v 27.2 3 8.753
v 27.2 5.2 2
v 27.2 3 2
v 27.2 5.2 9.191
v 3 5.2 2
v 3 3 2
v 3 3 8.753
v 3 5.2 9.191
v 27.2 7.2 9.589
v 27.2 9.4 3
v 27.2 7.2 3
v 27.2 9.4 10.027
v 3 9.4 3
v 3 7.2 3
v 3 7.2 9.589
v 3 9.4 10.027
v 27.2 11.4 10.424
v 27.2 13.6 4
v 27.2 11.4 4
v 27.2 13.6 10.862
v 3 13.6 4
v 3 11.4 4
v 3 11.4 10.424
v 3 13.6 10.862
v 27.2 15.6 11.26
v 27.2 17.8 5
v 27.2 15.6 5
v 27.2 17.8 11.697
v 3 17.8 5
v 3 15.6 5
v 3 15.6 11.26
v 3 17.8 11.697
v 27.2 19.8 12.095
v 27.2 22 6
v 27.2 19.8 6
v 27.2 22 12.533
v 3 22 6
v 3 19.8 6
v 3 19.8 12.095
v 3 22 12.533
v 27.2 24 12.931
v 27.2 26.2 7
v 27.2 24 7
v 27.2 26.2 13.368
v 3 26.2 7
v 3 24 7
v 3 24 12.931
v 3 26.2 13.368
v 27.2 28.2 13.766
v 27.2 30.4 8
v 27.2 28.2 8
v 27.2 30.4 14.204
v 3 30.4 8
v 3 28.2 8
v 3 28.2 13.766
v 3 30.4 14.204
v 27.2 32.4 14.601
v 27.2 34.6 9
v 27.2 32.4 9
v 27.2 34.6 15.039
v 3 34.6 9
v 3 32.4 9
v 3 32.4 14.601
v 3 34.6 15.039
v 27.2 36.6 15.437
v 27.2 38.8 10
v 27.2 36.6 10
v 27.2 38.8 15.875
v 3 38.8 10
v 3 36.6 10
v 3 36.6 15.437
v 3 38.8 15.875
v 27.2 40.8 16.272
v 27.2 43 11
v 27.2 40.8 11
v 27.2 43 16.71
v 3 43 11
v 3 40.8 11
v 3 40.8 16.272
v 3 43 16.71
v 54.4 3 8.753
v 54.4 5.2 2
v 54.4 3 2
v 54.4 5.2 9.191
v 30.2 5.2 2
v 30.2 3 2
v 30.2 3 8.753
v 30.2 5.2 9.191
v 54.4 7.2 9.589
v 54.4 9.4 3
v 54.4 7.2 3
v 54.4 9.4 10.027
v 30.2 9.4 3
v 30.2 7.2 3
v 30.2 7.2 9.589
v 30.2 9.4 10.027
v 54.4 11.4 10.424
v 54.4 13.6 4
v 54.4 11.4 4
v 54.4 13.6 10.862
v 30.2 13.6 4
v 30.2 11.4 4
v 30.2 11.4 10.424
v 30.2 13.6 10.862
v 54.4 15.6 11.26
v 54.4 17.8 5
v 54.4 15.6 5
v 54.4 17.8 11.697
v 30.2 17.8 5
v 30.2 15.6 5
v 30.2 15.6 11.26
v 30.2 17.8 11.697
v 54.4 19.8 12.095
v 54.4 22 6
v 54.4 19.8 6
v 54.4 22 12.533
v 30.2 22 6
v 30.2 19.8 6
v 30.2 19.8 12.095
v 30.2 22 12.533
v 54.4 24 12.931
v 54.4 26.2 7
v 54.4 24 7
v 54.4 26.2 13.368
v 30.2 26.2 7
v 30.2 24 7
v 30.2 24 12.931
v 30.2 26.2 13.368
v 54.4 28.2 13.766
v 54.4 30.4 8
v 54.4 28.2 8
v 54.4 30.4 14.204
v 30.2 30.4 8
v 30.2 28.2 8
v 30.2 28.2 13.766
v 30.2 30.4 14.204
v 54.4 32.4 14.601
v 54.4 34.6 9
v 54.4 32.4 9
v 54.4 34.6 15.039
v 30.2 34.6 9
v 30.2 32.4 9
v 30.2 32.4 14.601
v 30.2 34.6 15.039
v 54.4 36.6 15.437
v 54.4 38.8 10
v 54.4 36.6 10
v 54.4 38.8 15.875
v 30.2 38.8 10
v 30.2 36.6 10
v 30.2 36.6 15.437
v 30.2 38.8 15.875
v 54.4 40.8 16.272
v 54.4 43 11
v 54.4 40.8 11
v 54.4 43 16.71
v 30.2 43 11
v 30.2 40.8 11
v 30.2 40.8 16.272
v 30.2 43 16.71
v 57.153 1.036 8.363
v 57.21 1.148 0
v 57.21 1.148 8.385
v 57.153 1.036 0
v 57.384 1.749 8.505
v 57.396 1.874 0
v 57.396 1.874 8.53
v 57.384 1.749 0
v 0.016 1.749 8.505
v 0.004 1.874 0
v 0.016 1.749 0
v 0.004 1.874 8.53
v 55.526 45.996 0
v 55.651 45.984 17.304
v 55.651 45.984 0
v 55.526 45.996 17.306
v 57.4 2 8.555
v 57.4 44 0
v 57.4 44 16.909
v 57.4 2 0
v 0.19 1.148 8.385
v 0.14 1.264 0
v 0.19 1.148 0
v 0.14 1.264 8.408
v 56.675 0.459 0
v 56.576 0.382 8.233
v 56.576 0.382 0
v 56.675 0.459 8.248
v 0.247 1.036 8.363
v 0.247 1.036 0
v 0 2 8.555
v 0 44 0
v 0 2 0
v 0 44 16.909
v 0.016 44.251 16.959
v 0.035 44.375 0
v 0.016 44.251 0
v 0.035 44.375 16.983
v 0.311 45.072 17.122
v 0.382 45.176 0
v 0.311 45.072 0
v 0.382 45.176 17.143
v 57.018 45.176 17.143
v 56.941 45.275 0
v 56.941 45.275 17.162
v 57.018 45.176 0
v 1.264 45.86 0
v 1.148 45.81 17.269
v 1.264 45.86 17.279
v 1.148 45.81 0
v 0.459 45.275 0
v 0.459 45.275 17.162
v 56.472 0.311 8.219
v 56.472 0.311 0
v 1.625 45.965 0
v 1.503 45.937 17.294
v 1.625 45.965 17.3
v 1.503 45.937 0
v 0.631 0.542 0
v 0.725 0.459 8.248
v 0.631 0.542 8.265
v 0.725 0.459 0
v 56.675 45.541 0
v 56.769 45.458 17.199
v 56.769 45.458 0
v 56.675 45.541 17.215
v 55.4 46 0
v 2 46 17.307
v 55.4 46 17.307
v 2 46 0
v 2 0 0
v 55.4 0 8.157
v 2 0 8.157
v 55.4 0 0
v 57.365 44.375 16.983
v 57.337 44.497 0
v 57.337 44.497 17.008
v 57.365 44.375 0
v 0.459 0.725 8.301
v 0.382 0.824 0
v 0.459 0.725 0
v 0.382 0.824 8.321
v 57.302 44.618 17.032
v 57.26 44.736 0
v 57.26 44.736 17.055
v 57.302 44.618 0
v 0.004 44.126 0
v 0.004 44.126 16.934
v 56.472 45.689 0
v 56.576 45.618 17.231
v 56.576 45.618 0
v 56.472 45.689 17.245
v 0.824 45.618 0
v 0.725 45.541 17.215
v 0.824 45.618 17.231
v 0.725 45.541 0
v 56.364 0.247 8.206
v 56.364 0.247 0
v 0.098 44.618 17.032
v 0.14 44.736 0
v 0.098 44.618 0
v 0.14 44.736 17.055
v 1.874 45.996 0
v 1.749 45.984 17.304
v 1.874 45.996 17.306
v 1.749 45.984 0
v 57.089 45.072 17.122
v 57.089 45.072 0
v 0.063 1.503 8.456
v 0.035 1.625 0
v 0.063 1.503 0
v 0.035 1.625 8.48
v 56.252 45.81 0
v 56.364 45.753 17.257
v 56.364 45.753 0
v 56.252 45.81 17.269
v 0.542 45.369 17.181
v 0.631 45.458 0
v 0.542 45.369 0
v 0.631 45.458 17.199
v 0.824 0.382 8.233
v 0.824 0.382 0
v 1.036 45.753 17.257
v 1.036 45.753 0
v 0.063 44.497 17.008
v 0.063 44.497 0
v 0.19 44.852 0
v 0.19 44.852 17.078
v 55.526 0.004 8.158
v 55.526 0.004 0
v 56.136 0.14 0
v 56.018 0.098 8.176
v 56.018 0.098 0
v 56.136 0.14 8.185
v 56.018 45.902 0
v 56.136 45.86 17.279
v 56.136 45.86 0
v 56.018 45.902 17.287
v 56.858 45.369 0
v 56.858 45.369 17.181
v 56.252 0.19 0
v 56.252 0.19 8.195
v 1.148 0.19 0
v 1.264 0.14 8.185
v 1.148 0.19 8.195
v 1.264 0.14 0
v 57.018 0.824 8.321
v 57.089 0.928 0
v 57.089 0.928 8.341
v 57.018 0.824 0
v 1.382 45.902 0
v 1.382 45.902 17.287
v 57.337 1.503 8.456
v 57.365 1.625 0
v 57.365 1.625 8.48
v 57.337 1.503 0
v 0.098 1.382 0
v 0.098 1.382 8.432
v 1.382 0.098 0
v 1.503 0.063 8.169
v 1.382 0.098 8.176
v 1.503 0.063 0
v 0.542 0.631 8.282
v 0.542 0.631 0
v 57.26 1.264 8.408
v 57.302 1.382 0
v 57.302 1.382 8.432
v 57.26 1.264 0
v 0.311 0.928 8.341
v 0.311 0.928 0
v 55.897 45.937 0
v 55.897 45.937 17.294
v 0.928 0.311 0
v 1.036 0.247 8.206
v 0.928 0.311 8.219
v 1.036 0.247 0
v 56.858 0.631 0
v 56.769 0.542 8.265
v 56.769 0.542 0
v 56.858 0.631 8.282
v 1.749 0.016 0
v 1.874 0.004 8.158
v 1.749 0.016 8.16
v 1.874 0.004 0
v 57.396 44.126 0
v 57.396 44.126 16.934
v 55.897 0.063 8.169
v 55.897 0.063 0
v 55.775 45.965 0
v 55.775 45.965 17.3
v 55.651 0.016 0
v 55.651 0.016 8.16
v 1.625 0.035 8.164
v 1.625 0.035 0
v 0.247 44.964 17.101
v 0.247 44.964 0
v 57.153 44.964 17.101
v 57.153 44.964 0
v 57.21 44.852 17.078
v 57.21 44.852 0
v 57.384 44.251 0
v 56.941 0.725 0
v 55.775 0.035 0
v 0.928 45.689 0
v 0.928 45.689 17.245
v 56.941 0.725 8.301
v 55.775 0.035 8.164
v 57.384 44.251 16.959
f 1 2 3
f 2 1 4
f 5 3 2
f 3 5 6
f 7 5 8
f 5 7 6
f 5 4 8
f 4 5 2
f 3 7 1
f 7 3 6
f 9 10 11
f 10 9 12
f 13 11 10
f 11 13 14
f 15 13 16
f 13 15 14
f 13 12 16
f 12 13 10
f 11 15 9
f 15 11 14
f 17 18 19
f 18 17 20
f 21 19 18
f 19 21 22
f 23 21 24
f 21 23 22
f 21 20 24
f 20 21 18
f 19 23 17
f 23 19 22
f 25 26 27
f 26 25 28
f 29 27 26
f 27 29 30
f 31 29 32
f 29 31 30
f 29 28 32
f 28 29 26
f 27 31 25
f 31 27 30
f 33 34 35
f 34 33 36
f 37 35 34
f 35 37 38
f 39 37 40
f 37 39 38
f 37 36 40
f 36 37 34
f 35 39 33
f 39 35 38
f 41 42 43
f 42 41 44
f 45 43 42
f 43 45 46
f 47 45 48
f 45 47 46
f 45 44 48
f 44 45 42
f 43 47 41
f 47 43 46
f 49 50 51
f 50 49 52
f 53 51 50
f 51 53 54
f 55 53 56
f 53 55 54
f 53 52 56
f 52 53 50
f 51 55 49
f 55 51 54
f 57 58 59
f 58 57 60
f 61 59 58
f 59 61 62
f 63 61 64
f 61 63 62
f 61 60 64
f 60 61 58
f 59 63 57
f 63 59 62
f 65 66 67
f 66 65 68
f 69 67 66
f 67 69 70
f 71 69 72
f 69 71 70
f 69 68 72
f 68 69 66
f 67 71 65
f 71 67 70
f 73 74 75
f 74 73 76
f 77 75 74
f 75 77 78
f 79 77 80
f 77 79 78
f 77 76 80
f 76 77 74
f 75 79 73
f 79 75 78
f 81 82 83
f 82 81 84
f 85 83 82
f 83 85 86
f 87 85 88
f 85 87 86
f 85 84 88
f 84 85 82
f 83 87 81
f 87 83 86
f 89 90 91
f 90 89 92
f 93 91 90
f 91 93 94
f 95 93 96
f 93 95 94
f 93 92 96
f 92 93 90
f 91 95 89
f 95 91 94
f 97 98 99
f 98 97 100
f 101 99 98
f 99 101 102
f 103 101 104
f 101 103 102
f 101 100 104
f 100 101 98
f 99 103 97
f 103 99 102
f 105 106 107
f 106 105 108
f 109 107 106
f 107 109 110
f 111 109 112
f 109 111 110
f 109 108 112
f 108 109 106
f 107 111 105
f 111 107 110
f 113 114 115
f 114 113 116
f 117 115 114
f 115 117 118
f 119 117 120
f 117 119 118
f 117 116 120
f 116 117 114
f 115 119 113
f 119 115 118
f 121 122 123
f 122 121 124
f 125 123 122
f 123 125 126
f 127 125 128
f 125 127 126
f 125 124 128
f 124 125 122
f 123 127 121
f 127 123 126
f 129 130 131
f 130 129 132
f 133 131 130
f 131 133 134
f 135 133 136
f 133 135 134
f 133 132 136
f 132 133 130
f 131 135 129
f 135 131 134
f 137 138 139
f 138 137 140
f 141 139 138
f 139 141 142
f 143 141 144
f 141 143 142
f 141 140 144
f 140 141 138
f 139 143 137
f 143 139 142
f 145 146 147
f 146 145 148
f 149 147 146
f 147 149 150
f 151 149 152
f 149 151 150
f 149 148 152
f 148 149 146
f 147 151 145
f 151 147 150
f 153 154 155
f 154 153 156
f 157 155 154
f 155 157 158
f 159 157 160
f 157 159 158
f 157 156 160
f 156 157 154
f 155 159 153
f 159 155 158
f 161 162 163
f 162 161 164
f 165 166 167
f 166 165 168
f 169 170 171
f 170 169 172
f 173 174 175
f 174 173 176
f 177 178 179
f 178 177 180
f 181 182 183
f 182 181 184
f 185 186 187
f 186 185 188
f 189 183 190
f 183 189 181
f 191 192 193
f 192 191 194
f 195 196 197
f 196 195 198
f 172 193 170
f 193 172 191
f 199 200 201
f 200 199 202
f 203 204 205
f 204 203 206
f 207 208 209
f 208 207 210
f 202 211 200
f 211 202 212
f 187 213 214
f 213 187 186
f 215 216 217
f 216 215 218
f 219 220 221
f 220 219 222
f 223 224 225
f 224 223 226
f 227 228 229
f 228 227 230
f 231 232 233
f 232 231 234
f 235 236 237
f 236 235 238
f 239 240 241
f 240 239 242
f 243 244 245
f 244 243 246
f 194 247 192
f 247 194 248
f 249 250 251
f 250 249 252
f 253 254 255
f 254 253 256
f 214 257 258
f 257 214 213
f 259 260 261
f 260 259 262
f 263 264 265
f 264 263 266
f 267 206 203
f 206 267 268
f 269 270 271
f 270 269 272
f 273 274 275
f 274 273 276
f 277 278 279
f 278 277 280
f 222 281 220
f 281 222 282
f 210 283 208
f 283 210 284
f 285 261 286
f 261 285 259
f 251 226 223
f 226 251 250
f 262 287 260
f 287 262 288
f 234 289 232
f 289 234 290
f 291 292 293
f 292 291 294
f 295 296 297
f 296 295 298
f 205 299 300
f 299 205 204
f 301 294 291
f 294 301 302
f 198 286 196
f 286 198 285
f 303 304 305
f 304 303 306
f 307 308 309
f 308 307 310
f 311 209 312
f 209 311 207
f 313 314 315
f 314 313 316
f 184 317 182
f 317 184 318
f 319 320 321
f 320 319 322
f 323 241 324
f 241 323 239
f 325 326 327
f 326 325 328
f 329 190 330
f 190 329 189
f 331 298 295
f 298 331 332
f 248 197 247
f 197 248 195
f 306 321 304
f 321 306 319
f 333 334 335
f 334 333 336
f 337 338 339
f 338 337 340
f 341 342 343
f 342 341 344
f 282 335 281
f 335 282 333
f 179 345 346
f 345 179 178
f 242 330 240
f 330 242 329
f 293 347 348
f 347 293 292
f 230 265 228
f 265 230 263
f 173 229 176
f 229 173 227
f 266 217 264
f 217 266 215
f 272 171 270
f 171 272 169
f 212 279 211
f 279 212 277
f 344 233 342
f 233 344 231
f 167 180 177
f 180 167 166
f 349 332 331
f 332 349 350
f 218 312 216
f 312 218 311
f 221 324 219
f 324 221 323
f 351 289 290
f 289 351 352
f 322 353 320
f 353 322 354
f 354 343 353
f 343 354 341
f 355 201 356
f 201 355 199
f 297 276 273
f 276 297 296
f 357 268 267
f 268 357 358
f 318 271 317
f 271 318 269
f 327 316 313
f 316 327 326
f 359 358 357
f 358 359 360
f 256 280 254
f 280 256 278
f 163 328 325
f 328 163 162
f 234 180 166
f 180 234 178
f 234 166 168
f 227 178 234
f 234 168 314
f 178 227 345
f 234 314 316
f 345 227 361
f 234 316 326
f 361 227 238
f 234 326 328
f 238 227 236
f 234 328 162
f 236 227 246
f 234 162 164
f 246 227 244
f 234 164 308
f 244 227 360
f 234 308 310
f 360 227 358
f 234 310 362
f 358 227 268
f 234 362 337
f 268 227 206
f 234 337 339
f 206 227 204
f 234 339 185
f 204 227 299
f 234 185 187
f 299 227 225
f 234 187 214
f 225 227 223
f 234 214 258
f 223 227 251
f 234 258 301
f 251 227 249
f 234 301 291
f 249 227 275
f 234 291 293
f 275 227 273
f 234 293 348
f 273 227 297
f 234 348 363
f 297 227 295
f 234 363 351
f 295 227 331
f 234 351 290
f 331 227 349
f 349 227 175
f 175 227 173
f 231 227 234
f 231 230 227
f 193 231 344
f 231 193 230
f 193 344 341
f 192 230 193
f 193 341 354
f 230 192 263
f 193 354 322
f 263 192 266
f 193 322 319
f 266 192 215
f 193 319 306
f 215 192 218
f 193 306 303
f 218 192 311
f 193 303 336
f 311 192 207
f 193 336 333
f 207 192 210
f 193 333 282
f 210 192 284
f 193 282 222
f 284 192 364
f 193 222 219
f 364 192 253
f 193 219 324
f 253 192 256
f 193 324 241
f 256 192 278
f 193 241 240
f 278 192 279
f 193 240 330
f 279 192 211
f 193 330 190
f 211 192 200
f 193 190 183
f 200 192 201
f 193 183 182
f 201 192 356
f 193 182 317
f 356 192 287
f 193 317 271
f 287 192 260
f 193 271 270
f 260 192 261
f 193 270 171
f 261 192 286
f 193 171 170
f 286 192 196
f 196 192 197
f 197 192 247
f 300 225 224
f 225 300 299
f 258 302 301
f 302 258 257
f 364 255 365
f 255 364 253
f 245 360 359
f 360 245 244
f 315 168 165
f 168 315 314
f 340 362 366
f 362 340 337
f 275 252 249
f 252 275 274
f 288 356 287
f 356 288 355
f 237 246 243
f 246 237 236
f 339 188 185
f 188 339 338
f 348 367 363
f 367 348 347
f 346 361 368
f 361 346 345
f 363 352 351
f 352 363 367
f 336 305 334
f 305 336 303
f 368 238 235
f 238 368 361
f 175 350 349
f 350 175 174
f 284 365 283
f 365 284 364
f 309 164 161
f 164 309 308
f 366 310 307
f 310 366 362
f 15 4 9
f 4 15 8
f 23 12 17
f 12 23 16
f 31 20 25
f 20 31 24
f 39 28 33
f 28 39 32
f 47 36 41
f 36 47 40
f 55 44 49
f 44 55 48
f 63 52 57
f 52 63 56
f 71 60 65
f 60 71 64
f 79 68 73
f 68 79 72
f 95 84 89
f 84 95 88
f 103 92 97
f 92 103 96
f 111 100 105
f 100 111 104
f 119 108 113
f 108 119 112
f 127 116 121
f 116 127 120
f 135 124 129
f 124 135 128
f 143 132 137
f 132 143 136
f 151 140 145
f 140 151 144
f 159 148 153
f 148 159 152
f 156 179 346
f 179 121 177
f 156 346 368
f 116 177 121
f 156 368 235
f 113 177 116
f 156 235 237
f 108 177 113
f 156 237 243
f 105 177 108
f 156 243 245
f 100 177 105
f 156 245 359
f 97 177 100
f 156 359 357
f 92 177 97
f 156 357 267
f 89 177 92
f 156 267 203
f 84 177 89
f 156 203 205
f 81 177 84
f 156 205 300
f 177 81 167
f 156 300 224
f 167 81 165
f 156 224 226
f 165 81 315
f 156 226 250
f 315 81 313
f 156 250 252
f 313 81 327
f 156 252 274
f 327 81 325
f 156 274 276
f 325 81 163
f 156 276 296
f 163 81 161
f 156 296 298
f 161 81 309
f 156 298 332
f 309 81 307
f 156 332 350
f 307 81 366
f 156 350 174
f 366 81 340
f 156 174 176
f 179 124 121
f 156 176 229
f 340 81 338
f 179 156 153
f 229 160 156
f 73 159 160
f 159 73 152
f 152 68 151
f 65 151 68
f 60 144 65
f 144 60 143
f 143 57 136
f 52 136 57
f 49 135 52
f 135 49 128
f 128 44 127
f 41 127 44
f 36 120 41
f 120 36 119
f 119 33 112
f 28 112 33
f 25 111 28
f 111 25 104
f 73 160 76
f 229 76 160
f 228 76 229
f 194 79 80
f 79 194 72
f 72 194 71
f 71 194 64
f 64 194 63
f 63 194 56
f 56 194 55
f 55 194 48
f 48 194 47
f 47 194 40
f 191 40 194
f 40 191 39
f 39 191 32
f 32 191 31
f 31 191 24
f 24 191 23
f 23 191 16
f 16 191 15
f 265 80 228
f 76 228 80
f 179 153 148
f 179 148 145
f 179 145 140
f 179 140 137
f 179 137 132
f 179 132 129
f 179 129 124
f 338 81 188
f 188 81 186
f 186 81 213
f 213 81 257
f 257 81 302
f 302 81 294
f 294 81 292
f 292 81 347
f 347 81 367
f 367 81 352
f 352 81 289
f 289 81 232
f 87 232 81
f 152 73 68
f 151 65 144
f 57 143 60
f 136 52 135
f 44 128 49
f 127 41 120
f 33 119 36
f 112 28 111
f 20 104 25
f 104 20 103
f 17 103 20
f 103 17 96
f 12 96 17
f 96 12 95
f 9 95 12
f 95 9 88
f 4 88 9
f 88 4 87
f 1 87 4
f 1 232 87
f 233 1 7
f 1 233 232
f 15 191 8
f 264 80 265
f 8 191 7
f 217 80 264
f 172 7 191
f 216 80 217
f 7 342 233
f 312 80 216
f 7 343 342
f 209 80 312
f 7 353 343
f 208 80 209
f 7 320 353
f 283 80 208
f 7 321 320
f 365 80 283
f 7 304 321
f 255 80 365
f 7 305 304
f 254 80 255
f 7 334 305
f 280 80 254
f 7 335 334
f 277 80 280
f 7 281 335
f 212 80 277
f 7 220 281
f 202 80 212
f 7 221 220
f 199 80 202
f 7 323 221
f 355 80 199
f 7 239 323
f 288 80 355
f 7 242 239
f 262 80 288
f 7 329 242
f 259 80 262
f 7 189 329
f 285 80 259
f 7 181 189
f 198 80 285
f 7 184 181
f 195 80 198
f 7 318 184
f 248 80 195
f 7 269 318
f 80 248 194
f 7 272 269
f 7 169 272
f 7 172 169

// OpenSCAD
$fn = 100;

row_count = 10;
column_count = 2;
slope_angle = 22.5;
edge_radius = 2;
edge_margin = 3;
slot_length = 24.2;
slot_width = 2.2;
slot_depth = 8;
slot_spacing = 2;

vertical_step = 1;

module rounded_cube(xyz, r) {
    hull() {
        translate([r,      r,            0]) cylinder(xyz.z, r=r);
        translate([xyz.x - r, r,         0]) cylinder(xyz.z, r=r);
        translate([xyz.x - r, xyz.y - r, 0]) cylinder(xyz.z, r=r);
        translate([r,         xyz.y - r, 0]) cylinder(xyz.z, r=r);
    }
}

module slot_column(slot_xyz, count, spacing, step) {   
    for (i = [0 : count - 1]) {
        translate([0, i * (slot_xyz.y + spacing), i * step])
            cube([slot_xyz.x, slot_xyz.y, slot_xyz.z]);
    }
}

module slots_negative(slot_xyz, rows, columns, slot_spacing, column_spacing, step) {
    for (i = [0 : columns - 1]) {
        translate([i * (slot_xyz.x + column_spacing), 0, 0])
            slot_column(slot_xyz, rows, slot_spacing, step);
    }
}

module card_holder(slot_xyz, rows, columns, slot_spacing, column_spacing, step, r) {
    box_width = (slot_xyz.x + column_spacing) * columns + column_spacing;
    box_height = (slot_xyz.y + slot_spacing) * rows + slot_spacing / 2 + column_spacing;
    
    difference() {
        rounded_cube([box_width, box_height, step * (rows - 1) + slot_xyz.z + 2], r=r);
        
            rotate([11.25, 0, 0]) translate([0, 0, slot_xyz.z])
            cube([1000, 1000, 1000]);
        
        translate([edge_margin, edge_margin, 2])
            slots_negative(slot_xyz, rows, columns, slot_spacing, column_spacing, step);
    }
}

card_holder([slot_length, slot_width, slot_depth],
            row_count,
            column_count,
            slot_spacing,
            edge_margin,
            vertical_step,
            edge_radius
);
